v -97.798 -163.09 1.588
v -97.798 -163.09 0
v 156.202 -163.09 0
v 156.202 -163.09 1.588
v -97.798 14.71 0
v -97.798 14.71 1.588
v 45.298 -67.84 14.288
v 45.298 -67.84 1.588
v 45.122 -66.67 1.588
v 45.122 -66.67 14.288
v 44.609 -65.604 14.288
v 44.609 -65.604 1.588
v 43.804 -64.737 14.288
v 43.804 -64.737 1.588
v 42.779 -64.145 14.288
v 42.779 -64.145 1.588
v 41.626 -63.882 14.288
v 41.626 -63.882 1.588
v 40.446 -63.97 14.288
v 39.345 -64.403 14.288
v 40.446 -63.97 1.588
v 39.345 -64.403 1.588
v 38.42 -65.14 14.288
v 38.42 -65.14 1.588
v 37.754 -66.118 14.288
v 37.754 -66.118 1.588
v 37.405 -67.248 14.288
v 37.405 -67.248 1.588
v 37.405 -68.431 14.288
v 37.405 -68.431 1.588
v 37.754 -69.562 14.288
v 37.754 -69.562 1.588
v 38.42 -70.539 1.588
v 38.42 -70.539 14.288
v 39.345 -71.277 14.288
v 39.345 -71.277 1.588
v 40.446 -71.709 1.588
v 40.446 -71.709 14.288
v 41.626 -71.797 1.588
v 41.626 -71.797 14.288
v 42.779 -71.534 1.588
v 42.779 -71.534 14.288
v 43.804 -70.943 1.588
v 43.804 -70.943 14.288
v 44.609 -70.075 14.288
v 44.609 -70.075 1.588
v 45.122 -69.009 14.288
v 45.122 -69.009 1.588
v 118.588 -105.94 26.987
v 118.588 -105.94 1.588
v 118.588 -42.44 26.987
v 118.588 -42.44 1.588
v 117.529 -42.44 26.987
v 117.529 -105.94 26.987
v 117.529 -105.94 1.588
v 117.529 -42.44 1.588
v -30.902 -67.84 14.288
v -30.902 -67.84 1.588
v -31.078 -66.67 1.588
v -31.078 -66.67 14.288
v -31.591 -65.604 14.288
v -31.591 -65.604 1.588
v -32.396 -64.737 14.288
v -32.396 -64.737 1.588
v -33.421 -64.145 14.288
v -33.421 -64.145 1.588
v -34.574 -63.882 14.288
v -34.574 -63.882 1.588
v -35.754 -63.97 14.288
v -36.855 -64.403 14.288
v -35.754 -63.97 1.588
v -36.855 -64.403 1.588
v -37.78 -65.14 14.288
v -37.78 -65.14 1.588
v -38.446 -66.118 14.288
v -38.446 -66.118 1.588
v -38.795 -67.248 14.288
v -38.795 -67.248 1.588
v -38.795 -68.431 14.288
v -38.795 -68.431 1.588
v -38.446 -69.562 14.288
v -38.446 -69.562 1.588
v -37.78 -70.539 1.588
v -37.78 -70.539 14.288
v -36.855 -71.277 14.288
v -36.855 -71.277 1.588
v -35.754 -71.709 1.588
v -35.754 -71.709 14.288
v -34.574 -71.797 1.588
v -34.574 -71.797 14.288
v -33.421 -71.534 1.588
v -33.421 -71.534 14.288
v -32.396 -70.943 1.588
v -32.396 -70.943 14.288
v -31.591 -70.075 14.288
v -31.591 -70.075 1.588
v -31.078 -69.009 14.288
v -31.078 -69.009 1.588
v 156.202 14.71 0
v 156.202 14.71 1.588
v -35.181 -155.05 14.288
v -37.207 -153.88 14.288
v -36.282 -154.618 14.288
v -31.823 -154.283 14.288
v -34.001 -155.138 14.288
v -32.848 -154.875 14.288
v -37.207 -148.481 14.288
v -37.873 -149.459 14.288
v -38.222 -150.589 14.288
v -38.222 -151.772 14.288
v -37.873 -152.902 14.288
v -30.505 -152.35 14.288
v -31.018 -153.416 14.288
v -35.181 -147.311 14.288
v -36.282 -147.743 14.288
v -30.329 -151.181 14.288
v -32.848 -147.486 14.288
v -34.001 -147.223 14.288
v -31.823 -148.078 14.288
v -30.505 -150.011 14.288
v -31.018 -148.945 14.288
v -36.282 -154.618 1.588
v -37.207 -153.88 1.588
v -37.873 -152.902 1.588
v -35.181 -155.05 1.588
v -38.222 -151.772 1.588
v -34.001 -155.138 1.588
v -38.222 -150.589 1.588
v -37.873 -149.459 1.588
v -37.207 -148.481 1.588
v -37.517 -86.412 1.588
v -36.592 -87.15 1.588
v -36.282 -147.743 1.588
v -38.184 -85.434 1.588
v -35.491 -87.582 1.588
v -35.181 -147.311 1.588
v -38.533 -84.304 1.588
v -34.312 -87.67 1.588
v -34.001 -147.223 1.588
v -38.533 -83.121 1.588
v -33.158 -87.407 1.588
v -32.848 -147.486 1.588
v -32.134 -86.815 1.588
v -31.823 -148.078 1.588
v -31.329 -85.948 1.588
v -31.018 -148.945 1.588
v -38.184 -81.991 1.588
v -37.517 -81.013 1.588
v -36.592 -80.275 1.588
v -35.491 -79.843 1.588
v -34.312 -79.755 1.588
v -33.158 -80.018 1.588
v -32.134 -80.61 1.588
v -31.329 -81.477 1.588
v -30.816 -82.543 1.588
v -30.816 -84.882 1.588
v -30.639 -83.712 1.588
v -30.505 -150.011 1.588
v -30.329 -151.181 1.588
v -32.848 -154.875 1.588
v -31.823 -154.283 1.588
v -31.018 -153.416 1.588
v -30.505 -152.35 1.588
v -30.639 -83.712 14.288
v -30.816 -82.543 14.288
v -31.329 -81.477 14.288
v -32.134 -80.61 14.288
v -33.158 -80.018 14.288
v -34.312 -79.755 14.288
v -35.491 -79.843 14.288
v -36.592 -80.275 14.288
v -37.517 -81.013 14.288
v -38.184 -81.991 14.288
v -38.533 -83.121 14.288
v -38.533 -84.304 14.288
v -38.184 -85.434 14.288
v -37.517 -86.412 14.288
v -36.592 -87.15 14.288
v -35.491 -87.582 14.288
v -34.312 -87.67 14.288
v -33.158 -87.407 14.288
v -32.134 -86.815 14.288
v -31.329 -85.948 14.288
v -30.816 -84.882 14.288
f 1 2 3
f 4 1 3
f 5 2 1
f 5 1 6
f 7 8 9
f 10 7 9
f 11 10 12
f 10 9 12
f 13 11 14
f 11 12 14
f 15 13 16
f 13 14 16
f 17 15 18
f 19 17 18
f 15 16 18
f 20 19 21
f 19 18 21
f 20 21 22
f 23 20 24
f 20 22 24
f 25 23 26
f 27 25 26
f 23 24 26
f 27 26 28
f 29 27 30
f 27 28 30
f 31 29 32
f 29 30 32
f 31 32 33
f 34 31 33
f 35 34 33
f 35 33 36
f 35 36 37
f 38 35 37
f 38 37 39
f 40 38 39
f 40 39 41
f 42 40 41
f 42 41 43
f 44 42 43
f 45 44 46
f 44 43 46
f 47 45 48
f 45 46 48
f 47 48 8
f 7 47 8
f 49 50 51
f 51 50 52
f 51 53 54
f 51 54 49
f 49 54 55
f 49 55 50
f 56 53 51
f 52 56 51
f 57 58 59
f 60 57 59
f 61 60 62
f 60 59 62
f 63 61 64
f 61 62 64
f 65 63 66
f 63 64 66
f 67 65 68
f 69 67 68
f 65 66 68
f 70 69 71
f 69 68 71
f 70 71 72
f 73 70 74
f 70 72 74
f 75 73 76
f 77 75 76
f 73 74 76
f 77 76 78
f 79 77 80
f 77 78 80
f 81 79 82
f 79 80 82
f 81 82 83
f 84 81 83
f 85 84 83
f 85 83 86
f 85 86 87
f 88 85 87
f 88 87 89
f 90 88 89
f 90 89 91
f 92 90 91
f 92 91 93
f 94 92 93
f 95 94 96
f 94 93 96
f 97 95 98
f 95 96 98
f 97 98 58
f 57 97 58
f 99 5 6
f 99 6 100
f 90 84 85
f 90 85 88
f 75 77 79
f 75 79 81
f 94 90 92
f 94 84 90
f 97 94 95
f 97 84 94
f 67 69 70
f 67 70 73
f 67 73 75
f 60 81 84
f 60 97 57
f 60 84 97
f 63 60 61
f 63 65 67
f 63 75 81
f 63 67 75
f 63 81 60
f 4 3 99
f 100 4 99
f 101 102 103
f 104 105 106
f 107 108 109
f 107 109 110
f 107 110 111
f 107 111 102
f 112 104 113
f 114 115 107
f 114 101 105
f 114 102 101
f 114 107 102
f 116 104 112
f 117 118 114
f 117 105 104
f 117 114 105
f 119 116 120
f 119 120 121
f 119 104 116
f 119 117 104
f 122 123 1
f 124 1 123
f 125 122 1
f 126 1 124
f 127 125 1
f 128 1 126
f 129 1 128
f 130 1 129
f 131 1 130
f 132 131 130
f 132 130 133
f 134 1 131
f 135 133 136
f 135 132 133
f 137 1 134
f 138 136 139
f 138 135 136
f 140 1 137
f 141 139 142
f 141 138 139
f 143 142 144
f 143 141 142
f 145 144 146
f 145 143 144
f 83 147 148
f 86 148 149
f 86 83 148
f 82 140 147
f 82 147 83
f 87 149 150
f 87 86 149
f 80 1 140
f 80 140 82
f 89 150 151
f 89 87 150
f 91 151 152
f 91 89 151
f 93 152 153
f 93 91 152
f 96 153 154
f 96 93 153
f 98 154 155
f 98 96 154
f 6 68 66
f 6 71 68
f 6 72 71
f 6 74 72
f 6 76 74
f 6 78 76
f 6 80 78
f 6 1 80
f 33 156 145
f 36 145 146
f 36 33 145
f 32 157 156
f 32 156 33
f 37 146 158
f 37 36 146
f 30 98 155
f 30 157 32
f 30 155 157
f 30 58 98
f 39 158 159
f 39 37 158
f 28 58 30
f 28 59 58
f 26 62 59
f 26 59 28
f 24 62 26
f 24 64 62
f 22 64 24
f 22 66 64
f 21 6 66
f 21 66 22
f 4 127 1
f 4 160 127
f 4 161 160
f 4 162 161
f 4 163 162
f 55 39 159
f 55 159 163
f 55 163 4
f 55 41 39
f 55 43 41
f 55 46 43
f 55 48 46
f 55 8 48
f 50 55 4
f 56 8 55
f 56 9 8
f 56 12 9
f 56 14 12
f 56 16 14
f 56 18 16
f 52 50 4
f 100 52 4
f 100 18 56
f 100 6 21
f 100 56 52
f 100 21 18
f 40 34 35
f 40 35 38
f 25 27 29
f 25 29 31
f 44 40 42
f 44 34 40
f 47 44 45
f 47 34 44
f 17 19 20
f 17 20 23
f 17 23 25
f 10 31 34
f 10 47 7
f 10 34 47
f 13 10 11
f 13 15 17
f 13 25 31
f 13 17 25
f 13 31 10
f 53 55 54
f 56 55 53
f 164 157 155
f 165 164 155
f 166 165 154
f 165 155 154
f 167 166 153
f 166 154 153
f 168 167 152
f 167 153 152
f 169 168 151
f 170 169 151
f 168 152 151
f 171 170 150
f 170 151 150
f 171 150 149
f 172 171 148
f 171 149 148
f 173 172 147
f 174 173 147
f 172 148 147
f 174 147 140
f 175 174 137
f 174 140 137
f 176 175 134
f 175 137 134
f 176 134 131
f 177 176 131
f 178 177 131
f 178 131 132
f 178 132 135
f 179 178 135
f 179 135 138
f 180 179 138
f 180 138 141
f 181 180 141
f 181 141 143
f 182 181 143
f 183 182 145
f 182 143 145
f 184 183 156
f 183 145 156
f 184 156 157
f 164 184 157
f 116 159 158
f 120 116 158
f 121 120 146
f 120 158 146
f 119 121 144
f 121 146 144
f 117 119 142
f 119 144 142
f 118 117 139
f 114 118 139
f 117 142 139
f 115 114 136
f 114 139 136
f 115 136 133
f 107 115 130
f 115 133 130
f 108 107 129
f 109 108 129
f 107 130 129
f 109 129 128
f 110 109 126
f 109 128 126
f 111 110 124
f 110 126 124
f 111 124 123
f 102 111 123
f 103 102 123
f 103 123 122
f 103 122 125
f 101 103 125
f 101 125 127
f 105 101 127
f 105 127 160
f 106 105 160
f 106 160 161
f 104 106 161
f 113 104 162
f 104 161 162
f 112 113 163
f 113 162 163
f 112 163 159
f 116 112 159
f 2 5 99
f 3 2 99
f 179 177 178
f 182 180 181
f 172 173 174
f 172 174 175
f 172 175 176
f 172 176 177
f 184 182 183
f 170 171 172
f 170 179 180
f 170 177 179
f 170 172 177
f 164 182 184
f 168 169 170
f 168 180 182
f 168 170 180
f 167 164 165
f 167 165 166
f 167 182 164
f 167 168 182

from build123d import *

# Parameters (mm, degrees)
F0_W     = 254
F0_H     = 177.8
F1_DEPTH = 1.5875
F2_W     = 1.058418
F2_H     = 63.5
F3_DEPTH = 25.4
F4_R     = 3.96875
F5_DEPTH = 12.7
F6_R     = 3.96875
F7_DEPTH = 12.7


with BuildPart() as f1:
    # F0 (on Top) → F1 (new body)
    with BuildSketch(Plane.XY):
        with Locations((29.202467, -74.189657)):
            Rectangle(F0_W, F0_H)
    extrude(amount=F1_DEPTH)

    # F2 (on face) → F3 (join)
    with BuildSketch(Plane.XY.offset(1.5875)):
        with Locations((118.058609, -74.189657)):
            Rectangle(F2_W, F2_H)
    extrude(amount=F3_DEPTH)

    # F4 (on face) → F5 (join)
    with BuildSketch(Plane.XY.offset(1.5875)):
        with Locations((-34.60809, -83.712486)):
            Circle(F4_R)
        with Locations((-34.8706, -67.839657)):
            Circle(F4_R)
    extrude(amount=F5_DEPTH)

    # F6 (on face) → F7 (join)
    with BuildSketch(Plane.XY.offset(1.5875)):
        with Locations((41.3294, -67.839657)):
            Circle(F6_R)
        with Locations((-34.297533, -151.180522)):
            Circle(F6_R)
    extrude(amount=F7_DEPTH)


solid = f1.part
